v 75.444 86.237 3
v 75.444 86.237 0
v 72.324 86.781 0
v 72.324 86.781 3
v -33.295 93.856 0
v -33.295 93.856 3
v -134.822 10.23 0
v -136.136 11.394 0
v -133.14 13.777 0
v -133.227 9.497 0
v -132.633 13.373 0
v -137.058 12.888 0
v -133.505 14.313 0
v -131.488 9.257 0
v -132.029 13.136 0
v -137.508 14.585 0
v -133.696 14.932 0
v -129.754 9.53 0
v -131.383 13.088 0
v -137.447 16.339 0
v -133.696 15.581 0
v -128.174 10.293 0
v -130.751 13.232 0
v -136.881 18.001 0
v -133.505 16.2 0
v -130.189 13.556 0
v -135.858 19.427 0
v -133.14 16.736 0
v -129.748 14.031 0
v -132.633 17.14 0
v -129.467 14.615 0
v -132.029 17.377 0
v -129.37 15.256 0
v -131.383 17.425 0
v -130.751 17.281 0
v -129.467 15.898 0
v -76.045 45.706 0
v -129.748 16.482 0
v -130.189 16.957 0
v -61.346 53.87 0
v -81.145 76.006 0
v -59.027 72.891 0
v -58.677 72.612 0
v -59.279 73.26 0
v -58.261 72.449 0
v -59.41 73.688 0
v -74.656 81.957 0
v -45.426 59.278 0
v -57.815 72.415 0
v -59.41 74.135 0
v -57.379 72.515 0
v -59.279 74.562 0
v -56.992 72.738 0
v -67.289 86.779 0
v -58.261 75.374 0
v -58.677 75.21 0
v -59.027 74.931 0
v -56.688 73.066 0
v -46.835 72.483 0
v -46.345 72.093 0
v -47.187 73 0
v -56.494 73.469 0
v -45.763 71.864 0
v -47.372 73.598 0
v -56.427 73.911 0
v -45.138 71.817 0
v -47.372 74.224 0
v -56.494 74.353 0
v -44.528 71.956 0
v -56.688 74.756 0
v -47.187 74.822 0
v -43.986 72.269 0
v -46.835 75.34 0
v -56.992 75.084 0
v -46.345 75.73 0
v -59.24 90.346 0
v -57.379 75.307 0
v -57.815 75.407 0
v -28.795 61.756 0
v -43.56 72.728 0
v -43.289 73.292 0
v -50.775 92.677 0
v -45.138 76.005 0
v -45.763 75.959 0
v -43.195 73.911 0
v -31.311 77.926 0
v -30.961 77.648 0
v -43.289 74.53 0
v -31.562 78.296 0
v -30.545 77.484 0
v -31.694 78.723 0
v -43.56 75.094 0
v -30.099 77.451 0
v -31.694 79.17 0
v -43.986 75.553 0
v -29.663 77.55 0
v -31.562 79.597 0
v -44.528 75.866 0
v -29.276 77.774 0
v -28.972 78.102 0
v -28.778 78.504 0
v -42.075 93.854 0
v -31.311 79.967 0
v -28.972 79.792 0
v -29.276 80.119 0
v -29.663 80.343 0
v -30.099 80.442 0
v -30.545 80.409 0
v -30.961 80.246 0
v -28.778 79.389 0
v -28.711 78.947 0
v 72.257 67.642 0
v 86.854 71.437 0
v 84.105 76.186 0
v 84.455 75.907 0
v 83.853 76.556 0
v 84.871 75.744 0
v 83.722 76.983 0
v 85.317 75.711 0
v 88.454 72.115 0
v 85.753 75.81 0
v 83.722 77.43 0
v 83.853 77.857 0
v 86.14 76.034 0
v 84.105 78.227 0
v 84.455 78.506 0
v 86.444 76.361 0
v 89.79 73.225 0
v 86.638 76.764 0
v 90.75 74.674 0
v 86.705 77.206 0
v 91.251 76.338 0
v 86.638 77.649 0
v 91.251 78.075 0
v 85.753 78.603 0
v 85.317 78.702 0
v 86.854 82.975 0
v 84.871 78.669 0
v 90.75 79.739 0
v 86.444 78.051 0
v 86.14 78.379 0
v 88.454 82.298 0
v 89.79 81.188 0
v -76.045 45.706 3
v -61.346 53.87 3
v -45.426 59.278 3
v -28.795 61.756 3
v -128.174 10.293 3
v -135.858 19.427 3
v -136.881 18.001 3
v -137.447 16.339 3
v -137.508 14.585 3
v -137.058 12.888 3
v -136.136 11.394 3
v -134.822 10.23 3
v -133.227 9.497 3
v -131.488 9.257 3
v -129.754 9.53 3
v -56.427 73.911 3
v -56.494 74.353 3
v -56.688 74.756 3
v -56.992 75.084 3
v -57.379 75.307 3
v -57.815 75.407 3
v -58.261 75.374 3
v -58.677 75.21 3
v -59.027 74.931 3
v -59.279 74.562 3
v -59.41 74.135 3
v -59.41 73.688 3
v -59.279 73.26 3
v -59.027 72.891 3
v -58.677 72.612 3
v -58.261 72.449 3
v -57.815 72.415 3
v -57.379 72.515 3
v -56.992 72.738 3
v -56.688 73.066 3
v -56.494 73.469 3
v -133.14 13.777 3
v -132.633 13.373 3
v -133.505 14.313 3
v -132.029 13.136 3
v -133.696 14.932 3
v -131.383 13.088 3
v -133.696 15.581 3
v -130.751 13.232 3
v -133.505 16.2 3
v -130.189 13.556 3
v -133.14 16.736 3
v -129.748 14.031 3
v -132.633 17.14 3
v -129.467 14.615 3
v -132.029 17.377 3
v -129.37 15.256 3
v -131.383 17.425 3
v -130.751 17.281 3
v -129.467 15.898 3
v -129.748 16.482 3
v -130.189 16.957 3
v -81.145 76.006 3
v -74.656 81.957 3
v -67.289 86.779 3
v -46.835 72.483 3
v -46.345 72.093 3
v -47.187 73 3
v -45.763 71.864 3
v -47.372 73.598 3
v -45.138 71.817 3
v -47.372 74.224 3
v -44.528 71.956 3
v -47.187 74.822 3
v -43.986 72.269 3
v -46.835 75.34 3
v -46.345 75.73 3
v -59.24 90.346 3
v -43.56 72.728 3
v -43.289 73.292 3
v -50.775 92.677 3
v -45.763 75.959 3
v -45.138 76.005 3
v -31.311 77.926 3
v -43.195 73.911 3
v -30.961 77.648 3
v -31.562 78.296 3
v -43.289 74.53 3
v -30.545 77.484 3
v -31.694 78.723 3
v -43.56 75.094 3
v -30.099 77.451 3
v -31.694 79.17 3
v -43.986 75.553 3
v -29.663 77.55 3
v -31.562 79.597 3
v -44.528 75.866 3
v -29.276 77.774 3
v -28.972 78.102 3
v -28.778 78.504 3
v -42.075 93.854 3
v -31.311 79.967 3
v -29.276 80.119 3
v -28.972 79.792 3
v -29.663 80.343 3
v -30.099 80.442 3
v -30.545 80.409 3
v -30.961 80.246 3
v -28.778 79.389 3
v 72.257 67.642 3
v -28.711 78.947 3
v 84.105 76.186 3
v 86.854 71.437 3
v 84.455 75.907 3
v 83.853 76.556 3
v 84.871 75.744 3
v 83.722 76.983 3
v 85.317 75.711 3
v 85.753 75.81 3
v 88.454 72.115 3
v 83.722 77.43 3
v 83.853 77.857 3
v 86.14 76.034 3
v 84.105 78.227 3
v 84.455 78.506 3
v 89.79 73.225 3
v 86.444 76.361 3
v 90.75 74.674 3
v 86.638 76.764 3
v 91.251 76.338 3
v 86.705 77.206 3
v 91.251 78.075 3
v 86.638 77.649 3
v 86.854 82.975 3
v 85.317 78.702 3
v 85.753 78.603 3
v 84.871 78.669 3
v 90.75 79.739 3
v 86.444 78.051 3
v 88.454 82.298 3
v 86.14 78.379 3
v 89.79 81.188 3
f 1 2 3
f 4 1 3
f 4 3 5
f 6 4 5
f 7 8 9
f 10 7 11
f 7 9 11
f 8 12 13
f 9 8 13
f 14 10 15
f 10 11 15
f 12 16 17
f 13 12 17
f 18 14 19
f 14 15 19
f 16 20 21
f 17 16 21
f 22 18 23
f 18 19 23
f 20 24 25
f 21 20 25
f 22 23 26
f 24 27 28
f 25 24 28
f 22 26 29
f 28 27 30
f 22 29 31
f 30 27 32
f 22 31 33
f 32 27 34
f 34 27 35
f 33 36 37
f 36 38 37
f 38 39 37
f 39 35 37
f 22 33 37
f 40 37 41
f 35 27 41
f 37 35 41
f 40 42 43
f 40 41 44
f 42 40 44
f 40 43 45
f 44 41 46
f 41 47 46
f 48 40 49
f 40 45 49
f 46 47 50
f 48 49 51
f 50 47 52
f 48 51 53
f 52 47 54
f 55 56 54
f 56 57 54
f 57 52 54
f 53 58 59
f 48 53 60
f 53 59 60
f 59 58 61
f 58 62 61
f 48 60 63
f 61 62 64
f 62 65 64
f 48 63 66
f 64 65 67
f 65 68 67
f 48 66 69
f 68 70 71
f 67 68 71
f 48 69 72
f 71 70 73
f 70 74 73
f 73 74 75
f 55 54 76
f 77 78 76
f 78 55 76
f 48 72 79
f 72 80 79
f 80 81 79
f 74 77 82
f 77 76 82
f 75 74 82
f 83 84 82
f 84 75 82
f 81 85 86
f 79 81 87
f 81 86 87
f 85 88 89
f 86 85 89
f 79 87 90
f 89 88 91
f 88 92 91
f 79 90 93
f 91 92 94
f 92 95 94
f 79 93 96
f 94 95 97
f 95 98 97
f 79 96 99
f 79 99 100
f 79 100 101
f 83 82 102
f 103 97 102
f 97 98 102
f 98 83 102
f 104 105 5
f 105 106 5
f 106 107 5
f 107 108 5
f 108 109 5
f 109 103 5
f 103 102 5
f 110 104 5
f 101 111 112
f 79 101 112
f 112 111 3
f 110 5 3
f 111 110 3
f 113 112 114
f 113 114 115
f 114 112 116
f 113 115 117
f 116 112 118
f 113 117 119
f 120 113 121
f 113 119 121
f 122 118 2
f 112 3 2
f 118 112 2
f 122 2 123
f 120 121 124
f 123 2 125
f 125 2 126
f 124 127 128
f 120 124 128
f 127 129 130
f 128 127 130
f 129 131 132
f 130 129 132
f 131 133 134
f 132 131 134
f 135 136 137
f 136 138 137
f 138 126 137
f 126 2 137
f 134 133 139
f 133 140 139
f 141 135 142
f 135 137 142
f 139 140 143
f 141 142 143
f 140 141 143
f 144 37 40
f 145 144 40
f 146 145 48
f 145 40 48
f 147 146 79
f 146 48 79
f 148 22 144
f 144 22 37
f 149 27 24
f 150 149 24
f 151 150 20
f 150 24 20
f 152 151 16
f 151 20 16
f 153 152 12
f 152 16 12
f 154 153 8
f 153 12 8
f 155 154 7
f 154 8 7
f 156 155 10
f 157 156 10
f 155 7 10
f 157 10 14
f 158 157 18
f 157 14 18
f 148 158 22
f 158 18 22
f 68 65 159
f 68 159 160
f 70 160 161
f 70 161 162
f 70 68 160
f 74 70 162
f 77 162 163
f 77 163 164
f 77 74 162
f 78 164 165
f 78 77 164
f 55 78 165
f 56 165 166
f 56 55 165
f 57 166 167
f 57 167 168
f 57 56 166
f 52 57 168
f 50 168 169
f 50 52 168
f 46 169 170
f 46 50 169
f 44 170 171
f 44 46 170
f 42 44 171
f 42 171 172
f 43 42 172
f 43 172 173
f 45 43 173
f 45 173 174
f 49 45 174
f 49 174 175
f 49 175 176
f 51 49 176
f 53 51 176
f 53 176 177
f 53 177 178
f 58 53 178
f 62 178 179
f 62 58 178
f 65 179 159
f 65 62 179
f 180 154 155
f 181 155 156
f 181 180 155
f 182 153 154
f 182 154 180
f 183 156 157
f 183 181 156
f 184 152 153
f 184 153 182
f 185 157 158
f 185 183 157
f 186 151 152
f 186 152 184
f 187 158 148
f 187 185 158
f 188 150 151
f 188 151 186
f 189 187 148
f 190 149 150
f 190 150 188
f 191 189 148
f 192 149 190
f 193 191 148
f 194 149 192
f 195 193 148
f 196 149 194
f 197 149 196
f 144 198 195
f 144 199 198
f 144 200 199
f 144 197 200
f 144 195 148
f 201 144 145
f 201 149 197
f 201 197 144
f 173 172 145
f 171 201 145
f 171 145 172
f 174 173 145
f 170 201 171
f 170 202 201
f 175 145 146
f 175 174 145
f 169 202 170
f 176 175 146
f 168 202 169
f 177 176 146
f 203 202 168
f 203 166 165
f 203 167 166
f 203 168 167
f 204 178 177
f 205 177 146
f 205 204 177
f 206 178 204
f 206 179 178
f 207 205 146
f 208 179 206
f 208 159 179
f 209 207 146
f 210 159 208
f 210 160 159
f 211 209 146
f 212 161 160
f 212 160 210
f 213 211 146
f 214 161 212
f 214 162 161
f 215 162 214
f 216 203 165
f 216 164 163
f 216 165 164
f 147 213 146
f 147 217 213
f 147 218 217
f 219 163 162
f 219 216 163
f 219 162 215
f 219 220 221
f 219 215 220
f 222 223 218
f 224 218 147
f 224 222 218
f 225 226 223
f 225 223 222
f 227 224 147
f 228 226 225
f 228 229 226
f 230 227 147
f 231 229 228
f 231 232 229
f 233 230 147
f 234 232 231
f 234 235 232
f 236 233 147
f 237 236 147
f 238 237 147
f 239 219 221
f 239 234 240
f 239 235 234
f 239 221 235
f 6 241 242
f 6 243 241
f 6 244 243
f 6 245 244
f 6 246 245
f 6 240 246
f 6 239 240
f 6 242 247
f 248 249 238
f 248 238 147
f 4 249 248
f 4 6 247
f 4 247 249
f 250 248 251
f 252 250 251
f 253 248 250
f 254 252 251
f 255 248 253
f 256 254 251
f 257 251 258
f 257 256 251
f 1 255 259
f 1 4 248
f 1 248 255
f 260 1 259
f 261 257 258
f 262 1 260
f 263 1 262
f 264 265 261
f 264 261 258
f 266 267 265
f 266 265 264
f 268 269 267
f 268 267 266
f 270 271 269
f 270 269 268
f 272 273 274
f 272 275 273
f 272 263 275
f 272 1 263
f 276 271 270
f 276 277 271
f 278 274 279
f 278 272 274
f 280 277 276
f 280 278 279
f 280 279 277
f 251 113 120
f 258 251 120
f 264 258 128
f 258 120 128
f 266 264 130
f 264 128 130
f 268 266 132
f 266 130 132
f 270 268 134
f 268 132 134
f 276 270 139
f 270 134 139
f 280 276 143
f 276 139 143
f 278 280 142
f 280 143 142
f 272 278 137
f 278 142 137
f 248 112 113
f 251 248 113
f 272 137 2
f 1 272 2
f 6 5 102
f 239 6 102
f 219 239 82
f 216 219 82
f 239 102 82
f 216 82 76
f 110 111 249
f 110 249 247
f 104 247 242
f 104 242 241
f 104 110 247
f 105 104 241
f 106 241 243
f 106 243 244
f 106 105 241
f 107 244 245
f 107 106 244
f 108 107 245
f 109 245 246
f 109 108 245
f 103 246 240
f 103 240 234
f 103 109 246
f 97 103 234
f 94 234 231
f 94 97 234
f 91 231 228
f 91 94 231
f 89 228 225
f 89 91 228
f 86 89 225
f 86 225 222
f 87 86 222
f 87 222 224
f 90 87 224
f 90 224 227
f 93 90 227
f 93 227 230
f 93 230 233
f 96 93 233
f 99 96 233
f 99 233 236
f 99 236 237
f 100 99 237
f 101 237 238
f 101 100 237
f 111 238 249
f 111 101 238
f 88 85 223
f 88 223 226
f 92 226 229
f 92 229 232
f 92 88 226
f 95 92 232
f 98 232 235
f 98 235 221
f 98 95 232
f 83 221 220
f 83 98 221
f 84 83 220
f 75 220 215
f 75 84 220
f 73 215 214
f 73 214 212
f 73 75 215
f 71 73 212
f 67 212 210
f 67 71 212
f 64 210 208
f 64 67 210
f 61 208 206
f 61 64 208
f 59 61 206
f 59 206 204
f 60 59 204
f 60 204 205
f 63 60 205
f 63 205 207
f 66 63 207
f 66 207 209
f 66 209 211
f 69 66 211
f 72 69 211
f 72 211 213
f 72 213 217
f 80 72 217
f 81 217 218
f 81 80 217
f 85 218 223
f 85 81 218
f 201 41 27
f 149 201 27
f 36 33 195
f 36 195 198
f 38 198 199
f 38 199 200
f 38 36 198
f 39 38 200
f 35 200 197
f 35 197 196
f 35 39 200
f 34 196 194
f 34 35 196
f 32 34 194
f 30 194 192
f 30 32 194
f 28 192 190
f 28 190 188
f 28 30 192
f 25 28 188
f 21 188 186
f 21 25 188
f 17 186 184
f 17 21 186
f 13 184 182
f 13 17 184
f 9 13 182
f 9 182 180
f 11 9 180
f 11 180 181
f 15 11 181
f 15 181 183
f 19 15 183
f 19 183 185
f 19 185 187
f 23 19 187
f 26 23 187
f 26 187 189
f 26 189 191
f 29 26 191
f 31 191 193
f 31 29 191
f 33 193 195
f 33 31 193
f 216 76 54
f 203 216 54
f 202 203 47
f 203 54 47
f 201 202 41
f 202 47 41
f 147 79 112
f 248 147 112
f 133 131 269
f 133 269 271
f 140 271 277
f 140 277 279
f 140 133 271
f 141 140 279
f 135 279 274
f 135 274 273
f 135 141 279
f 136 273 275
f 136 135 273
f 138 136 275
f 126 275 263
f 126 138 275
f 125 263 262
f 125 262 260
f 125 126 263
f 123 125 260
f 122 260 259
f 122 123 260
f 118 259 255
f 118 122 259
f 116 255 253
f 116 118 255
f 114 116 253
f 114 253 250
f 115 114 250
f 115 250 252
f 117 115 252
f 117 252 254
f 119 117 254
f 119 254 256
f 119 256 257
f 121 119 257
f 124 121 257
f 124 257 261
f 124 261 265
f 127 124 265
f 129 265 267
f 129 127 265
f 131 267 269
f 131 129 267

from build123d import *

# Parameters (mm, degrees)
SKETCH1_R           = 1.5
SKETCH1_R_2         = 2.1
SKETCH1_R_3         = 2.175
BOSS_EXTRUDE3_DEPTH = 3


with BuildPart() as part:
    # Sketch1 → Boss-Extrude3 (new body)
    with BuildSketch(Plane.XY):
        with BuildLine():
            Line((-128.173606683, 10.293399025), (-76.045238805, 45.70647235))
            ThreePointArc((-76.045238805, 45.70647235), (-53.507275984, 56.931628533), (-28.795238805, 61.75647235))
            Line((-28.795238805, 61.75647235), (72.257182683, 67.642360637))
            Line((72.257182683, 67.642360637), (86.853615252, 71.437479344))
            ThreePointArc((86.853615252, 71.437479344), (91.314459888, 77.20647235), (86.853615252, 82.975465356))
            Line((86.853615252, 82.975465356), (75.443530199, 86.236617693))
            Line((75.443530199, 86.236617693), (72.32406126, 86.780586344))
            Line((72.32406126, 86.780586344), (-33.295238805, 93.85647235))
            ThreePointArc((-33.295238805, 93.85647235), (-46.44497492, 93.411826928), (-59.240002329, 90.345796421))
            ThreePointArc((-59.240002329, 90.345796421), (-71.070665181, 84.517465038), (-81.145238805, 76.00647235))
            Line((-81.145238805, 76.00647235), (-135.858404881, 19.427395317))
            ThreePointArc((-135.858404881, 19.427395317), (-136.13643621, 11.393713442), (-128.173606683, 10.293399025))
        make_face()
        with Locations((85.204761195, 77.20647235)):
            Circle(SKETCH1_R, mode=Mode.SUBTRACT)
        with Locations((-45.295238805, 73.911181311)):
            Circle(SKETCH1_R_2, mode=Mode.SUBTRACT)
        with Locations((-131.545238805, 15.25647235)):
            Circle(SKETCH1_R_3, mode=Mode.SUBTRACT)
        with Locations((-57.927136979, 73.911181311)):
            Circle(SKETCH1_R, mode=Mode.SUBTRACT)
        with Locations((-30.210957337, 78.946585736)):
            Circle(SKETCH1_R, mode=Mode.SUBTRACT)
    extrude(amount=BOSS_EXTRUDE3_DEPTH)


solid = part.part
